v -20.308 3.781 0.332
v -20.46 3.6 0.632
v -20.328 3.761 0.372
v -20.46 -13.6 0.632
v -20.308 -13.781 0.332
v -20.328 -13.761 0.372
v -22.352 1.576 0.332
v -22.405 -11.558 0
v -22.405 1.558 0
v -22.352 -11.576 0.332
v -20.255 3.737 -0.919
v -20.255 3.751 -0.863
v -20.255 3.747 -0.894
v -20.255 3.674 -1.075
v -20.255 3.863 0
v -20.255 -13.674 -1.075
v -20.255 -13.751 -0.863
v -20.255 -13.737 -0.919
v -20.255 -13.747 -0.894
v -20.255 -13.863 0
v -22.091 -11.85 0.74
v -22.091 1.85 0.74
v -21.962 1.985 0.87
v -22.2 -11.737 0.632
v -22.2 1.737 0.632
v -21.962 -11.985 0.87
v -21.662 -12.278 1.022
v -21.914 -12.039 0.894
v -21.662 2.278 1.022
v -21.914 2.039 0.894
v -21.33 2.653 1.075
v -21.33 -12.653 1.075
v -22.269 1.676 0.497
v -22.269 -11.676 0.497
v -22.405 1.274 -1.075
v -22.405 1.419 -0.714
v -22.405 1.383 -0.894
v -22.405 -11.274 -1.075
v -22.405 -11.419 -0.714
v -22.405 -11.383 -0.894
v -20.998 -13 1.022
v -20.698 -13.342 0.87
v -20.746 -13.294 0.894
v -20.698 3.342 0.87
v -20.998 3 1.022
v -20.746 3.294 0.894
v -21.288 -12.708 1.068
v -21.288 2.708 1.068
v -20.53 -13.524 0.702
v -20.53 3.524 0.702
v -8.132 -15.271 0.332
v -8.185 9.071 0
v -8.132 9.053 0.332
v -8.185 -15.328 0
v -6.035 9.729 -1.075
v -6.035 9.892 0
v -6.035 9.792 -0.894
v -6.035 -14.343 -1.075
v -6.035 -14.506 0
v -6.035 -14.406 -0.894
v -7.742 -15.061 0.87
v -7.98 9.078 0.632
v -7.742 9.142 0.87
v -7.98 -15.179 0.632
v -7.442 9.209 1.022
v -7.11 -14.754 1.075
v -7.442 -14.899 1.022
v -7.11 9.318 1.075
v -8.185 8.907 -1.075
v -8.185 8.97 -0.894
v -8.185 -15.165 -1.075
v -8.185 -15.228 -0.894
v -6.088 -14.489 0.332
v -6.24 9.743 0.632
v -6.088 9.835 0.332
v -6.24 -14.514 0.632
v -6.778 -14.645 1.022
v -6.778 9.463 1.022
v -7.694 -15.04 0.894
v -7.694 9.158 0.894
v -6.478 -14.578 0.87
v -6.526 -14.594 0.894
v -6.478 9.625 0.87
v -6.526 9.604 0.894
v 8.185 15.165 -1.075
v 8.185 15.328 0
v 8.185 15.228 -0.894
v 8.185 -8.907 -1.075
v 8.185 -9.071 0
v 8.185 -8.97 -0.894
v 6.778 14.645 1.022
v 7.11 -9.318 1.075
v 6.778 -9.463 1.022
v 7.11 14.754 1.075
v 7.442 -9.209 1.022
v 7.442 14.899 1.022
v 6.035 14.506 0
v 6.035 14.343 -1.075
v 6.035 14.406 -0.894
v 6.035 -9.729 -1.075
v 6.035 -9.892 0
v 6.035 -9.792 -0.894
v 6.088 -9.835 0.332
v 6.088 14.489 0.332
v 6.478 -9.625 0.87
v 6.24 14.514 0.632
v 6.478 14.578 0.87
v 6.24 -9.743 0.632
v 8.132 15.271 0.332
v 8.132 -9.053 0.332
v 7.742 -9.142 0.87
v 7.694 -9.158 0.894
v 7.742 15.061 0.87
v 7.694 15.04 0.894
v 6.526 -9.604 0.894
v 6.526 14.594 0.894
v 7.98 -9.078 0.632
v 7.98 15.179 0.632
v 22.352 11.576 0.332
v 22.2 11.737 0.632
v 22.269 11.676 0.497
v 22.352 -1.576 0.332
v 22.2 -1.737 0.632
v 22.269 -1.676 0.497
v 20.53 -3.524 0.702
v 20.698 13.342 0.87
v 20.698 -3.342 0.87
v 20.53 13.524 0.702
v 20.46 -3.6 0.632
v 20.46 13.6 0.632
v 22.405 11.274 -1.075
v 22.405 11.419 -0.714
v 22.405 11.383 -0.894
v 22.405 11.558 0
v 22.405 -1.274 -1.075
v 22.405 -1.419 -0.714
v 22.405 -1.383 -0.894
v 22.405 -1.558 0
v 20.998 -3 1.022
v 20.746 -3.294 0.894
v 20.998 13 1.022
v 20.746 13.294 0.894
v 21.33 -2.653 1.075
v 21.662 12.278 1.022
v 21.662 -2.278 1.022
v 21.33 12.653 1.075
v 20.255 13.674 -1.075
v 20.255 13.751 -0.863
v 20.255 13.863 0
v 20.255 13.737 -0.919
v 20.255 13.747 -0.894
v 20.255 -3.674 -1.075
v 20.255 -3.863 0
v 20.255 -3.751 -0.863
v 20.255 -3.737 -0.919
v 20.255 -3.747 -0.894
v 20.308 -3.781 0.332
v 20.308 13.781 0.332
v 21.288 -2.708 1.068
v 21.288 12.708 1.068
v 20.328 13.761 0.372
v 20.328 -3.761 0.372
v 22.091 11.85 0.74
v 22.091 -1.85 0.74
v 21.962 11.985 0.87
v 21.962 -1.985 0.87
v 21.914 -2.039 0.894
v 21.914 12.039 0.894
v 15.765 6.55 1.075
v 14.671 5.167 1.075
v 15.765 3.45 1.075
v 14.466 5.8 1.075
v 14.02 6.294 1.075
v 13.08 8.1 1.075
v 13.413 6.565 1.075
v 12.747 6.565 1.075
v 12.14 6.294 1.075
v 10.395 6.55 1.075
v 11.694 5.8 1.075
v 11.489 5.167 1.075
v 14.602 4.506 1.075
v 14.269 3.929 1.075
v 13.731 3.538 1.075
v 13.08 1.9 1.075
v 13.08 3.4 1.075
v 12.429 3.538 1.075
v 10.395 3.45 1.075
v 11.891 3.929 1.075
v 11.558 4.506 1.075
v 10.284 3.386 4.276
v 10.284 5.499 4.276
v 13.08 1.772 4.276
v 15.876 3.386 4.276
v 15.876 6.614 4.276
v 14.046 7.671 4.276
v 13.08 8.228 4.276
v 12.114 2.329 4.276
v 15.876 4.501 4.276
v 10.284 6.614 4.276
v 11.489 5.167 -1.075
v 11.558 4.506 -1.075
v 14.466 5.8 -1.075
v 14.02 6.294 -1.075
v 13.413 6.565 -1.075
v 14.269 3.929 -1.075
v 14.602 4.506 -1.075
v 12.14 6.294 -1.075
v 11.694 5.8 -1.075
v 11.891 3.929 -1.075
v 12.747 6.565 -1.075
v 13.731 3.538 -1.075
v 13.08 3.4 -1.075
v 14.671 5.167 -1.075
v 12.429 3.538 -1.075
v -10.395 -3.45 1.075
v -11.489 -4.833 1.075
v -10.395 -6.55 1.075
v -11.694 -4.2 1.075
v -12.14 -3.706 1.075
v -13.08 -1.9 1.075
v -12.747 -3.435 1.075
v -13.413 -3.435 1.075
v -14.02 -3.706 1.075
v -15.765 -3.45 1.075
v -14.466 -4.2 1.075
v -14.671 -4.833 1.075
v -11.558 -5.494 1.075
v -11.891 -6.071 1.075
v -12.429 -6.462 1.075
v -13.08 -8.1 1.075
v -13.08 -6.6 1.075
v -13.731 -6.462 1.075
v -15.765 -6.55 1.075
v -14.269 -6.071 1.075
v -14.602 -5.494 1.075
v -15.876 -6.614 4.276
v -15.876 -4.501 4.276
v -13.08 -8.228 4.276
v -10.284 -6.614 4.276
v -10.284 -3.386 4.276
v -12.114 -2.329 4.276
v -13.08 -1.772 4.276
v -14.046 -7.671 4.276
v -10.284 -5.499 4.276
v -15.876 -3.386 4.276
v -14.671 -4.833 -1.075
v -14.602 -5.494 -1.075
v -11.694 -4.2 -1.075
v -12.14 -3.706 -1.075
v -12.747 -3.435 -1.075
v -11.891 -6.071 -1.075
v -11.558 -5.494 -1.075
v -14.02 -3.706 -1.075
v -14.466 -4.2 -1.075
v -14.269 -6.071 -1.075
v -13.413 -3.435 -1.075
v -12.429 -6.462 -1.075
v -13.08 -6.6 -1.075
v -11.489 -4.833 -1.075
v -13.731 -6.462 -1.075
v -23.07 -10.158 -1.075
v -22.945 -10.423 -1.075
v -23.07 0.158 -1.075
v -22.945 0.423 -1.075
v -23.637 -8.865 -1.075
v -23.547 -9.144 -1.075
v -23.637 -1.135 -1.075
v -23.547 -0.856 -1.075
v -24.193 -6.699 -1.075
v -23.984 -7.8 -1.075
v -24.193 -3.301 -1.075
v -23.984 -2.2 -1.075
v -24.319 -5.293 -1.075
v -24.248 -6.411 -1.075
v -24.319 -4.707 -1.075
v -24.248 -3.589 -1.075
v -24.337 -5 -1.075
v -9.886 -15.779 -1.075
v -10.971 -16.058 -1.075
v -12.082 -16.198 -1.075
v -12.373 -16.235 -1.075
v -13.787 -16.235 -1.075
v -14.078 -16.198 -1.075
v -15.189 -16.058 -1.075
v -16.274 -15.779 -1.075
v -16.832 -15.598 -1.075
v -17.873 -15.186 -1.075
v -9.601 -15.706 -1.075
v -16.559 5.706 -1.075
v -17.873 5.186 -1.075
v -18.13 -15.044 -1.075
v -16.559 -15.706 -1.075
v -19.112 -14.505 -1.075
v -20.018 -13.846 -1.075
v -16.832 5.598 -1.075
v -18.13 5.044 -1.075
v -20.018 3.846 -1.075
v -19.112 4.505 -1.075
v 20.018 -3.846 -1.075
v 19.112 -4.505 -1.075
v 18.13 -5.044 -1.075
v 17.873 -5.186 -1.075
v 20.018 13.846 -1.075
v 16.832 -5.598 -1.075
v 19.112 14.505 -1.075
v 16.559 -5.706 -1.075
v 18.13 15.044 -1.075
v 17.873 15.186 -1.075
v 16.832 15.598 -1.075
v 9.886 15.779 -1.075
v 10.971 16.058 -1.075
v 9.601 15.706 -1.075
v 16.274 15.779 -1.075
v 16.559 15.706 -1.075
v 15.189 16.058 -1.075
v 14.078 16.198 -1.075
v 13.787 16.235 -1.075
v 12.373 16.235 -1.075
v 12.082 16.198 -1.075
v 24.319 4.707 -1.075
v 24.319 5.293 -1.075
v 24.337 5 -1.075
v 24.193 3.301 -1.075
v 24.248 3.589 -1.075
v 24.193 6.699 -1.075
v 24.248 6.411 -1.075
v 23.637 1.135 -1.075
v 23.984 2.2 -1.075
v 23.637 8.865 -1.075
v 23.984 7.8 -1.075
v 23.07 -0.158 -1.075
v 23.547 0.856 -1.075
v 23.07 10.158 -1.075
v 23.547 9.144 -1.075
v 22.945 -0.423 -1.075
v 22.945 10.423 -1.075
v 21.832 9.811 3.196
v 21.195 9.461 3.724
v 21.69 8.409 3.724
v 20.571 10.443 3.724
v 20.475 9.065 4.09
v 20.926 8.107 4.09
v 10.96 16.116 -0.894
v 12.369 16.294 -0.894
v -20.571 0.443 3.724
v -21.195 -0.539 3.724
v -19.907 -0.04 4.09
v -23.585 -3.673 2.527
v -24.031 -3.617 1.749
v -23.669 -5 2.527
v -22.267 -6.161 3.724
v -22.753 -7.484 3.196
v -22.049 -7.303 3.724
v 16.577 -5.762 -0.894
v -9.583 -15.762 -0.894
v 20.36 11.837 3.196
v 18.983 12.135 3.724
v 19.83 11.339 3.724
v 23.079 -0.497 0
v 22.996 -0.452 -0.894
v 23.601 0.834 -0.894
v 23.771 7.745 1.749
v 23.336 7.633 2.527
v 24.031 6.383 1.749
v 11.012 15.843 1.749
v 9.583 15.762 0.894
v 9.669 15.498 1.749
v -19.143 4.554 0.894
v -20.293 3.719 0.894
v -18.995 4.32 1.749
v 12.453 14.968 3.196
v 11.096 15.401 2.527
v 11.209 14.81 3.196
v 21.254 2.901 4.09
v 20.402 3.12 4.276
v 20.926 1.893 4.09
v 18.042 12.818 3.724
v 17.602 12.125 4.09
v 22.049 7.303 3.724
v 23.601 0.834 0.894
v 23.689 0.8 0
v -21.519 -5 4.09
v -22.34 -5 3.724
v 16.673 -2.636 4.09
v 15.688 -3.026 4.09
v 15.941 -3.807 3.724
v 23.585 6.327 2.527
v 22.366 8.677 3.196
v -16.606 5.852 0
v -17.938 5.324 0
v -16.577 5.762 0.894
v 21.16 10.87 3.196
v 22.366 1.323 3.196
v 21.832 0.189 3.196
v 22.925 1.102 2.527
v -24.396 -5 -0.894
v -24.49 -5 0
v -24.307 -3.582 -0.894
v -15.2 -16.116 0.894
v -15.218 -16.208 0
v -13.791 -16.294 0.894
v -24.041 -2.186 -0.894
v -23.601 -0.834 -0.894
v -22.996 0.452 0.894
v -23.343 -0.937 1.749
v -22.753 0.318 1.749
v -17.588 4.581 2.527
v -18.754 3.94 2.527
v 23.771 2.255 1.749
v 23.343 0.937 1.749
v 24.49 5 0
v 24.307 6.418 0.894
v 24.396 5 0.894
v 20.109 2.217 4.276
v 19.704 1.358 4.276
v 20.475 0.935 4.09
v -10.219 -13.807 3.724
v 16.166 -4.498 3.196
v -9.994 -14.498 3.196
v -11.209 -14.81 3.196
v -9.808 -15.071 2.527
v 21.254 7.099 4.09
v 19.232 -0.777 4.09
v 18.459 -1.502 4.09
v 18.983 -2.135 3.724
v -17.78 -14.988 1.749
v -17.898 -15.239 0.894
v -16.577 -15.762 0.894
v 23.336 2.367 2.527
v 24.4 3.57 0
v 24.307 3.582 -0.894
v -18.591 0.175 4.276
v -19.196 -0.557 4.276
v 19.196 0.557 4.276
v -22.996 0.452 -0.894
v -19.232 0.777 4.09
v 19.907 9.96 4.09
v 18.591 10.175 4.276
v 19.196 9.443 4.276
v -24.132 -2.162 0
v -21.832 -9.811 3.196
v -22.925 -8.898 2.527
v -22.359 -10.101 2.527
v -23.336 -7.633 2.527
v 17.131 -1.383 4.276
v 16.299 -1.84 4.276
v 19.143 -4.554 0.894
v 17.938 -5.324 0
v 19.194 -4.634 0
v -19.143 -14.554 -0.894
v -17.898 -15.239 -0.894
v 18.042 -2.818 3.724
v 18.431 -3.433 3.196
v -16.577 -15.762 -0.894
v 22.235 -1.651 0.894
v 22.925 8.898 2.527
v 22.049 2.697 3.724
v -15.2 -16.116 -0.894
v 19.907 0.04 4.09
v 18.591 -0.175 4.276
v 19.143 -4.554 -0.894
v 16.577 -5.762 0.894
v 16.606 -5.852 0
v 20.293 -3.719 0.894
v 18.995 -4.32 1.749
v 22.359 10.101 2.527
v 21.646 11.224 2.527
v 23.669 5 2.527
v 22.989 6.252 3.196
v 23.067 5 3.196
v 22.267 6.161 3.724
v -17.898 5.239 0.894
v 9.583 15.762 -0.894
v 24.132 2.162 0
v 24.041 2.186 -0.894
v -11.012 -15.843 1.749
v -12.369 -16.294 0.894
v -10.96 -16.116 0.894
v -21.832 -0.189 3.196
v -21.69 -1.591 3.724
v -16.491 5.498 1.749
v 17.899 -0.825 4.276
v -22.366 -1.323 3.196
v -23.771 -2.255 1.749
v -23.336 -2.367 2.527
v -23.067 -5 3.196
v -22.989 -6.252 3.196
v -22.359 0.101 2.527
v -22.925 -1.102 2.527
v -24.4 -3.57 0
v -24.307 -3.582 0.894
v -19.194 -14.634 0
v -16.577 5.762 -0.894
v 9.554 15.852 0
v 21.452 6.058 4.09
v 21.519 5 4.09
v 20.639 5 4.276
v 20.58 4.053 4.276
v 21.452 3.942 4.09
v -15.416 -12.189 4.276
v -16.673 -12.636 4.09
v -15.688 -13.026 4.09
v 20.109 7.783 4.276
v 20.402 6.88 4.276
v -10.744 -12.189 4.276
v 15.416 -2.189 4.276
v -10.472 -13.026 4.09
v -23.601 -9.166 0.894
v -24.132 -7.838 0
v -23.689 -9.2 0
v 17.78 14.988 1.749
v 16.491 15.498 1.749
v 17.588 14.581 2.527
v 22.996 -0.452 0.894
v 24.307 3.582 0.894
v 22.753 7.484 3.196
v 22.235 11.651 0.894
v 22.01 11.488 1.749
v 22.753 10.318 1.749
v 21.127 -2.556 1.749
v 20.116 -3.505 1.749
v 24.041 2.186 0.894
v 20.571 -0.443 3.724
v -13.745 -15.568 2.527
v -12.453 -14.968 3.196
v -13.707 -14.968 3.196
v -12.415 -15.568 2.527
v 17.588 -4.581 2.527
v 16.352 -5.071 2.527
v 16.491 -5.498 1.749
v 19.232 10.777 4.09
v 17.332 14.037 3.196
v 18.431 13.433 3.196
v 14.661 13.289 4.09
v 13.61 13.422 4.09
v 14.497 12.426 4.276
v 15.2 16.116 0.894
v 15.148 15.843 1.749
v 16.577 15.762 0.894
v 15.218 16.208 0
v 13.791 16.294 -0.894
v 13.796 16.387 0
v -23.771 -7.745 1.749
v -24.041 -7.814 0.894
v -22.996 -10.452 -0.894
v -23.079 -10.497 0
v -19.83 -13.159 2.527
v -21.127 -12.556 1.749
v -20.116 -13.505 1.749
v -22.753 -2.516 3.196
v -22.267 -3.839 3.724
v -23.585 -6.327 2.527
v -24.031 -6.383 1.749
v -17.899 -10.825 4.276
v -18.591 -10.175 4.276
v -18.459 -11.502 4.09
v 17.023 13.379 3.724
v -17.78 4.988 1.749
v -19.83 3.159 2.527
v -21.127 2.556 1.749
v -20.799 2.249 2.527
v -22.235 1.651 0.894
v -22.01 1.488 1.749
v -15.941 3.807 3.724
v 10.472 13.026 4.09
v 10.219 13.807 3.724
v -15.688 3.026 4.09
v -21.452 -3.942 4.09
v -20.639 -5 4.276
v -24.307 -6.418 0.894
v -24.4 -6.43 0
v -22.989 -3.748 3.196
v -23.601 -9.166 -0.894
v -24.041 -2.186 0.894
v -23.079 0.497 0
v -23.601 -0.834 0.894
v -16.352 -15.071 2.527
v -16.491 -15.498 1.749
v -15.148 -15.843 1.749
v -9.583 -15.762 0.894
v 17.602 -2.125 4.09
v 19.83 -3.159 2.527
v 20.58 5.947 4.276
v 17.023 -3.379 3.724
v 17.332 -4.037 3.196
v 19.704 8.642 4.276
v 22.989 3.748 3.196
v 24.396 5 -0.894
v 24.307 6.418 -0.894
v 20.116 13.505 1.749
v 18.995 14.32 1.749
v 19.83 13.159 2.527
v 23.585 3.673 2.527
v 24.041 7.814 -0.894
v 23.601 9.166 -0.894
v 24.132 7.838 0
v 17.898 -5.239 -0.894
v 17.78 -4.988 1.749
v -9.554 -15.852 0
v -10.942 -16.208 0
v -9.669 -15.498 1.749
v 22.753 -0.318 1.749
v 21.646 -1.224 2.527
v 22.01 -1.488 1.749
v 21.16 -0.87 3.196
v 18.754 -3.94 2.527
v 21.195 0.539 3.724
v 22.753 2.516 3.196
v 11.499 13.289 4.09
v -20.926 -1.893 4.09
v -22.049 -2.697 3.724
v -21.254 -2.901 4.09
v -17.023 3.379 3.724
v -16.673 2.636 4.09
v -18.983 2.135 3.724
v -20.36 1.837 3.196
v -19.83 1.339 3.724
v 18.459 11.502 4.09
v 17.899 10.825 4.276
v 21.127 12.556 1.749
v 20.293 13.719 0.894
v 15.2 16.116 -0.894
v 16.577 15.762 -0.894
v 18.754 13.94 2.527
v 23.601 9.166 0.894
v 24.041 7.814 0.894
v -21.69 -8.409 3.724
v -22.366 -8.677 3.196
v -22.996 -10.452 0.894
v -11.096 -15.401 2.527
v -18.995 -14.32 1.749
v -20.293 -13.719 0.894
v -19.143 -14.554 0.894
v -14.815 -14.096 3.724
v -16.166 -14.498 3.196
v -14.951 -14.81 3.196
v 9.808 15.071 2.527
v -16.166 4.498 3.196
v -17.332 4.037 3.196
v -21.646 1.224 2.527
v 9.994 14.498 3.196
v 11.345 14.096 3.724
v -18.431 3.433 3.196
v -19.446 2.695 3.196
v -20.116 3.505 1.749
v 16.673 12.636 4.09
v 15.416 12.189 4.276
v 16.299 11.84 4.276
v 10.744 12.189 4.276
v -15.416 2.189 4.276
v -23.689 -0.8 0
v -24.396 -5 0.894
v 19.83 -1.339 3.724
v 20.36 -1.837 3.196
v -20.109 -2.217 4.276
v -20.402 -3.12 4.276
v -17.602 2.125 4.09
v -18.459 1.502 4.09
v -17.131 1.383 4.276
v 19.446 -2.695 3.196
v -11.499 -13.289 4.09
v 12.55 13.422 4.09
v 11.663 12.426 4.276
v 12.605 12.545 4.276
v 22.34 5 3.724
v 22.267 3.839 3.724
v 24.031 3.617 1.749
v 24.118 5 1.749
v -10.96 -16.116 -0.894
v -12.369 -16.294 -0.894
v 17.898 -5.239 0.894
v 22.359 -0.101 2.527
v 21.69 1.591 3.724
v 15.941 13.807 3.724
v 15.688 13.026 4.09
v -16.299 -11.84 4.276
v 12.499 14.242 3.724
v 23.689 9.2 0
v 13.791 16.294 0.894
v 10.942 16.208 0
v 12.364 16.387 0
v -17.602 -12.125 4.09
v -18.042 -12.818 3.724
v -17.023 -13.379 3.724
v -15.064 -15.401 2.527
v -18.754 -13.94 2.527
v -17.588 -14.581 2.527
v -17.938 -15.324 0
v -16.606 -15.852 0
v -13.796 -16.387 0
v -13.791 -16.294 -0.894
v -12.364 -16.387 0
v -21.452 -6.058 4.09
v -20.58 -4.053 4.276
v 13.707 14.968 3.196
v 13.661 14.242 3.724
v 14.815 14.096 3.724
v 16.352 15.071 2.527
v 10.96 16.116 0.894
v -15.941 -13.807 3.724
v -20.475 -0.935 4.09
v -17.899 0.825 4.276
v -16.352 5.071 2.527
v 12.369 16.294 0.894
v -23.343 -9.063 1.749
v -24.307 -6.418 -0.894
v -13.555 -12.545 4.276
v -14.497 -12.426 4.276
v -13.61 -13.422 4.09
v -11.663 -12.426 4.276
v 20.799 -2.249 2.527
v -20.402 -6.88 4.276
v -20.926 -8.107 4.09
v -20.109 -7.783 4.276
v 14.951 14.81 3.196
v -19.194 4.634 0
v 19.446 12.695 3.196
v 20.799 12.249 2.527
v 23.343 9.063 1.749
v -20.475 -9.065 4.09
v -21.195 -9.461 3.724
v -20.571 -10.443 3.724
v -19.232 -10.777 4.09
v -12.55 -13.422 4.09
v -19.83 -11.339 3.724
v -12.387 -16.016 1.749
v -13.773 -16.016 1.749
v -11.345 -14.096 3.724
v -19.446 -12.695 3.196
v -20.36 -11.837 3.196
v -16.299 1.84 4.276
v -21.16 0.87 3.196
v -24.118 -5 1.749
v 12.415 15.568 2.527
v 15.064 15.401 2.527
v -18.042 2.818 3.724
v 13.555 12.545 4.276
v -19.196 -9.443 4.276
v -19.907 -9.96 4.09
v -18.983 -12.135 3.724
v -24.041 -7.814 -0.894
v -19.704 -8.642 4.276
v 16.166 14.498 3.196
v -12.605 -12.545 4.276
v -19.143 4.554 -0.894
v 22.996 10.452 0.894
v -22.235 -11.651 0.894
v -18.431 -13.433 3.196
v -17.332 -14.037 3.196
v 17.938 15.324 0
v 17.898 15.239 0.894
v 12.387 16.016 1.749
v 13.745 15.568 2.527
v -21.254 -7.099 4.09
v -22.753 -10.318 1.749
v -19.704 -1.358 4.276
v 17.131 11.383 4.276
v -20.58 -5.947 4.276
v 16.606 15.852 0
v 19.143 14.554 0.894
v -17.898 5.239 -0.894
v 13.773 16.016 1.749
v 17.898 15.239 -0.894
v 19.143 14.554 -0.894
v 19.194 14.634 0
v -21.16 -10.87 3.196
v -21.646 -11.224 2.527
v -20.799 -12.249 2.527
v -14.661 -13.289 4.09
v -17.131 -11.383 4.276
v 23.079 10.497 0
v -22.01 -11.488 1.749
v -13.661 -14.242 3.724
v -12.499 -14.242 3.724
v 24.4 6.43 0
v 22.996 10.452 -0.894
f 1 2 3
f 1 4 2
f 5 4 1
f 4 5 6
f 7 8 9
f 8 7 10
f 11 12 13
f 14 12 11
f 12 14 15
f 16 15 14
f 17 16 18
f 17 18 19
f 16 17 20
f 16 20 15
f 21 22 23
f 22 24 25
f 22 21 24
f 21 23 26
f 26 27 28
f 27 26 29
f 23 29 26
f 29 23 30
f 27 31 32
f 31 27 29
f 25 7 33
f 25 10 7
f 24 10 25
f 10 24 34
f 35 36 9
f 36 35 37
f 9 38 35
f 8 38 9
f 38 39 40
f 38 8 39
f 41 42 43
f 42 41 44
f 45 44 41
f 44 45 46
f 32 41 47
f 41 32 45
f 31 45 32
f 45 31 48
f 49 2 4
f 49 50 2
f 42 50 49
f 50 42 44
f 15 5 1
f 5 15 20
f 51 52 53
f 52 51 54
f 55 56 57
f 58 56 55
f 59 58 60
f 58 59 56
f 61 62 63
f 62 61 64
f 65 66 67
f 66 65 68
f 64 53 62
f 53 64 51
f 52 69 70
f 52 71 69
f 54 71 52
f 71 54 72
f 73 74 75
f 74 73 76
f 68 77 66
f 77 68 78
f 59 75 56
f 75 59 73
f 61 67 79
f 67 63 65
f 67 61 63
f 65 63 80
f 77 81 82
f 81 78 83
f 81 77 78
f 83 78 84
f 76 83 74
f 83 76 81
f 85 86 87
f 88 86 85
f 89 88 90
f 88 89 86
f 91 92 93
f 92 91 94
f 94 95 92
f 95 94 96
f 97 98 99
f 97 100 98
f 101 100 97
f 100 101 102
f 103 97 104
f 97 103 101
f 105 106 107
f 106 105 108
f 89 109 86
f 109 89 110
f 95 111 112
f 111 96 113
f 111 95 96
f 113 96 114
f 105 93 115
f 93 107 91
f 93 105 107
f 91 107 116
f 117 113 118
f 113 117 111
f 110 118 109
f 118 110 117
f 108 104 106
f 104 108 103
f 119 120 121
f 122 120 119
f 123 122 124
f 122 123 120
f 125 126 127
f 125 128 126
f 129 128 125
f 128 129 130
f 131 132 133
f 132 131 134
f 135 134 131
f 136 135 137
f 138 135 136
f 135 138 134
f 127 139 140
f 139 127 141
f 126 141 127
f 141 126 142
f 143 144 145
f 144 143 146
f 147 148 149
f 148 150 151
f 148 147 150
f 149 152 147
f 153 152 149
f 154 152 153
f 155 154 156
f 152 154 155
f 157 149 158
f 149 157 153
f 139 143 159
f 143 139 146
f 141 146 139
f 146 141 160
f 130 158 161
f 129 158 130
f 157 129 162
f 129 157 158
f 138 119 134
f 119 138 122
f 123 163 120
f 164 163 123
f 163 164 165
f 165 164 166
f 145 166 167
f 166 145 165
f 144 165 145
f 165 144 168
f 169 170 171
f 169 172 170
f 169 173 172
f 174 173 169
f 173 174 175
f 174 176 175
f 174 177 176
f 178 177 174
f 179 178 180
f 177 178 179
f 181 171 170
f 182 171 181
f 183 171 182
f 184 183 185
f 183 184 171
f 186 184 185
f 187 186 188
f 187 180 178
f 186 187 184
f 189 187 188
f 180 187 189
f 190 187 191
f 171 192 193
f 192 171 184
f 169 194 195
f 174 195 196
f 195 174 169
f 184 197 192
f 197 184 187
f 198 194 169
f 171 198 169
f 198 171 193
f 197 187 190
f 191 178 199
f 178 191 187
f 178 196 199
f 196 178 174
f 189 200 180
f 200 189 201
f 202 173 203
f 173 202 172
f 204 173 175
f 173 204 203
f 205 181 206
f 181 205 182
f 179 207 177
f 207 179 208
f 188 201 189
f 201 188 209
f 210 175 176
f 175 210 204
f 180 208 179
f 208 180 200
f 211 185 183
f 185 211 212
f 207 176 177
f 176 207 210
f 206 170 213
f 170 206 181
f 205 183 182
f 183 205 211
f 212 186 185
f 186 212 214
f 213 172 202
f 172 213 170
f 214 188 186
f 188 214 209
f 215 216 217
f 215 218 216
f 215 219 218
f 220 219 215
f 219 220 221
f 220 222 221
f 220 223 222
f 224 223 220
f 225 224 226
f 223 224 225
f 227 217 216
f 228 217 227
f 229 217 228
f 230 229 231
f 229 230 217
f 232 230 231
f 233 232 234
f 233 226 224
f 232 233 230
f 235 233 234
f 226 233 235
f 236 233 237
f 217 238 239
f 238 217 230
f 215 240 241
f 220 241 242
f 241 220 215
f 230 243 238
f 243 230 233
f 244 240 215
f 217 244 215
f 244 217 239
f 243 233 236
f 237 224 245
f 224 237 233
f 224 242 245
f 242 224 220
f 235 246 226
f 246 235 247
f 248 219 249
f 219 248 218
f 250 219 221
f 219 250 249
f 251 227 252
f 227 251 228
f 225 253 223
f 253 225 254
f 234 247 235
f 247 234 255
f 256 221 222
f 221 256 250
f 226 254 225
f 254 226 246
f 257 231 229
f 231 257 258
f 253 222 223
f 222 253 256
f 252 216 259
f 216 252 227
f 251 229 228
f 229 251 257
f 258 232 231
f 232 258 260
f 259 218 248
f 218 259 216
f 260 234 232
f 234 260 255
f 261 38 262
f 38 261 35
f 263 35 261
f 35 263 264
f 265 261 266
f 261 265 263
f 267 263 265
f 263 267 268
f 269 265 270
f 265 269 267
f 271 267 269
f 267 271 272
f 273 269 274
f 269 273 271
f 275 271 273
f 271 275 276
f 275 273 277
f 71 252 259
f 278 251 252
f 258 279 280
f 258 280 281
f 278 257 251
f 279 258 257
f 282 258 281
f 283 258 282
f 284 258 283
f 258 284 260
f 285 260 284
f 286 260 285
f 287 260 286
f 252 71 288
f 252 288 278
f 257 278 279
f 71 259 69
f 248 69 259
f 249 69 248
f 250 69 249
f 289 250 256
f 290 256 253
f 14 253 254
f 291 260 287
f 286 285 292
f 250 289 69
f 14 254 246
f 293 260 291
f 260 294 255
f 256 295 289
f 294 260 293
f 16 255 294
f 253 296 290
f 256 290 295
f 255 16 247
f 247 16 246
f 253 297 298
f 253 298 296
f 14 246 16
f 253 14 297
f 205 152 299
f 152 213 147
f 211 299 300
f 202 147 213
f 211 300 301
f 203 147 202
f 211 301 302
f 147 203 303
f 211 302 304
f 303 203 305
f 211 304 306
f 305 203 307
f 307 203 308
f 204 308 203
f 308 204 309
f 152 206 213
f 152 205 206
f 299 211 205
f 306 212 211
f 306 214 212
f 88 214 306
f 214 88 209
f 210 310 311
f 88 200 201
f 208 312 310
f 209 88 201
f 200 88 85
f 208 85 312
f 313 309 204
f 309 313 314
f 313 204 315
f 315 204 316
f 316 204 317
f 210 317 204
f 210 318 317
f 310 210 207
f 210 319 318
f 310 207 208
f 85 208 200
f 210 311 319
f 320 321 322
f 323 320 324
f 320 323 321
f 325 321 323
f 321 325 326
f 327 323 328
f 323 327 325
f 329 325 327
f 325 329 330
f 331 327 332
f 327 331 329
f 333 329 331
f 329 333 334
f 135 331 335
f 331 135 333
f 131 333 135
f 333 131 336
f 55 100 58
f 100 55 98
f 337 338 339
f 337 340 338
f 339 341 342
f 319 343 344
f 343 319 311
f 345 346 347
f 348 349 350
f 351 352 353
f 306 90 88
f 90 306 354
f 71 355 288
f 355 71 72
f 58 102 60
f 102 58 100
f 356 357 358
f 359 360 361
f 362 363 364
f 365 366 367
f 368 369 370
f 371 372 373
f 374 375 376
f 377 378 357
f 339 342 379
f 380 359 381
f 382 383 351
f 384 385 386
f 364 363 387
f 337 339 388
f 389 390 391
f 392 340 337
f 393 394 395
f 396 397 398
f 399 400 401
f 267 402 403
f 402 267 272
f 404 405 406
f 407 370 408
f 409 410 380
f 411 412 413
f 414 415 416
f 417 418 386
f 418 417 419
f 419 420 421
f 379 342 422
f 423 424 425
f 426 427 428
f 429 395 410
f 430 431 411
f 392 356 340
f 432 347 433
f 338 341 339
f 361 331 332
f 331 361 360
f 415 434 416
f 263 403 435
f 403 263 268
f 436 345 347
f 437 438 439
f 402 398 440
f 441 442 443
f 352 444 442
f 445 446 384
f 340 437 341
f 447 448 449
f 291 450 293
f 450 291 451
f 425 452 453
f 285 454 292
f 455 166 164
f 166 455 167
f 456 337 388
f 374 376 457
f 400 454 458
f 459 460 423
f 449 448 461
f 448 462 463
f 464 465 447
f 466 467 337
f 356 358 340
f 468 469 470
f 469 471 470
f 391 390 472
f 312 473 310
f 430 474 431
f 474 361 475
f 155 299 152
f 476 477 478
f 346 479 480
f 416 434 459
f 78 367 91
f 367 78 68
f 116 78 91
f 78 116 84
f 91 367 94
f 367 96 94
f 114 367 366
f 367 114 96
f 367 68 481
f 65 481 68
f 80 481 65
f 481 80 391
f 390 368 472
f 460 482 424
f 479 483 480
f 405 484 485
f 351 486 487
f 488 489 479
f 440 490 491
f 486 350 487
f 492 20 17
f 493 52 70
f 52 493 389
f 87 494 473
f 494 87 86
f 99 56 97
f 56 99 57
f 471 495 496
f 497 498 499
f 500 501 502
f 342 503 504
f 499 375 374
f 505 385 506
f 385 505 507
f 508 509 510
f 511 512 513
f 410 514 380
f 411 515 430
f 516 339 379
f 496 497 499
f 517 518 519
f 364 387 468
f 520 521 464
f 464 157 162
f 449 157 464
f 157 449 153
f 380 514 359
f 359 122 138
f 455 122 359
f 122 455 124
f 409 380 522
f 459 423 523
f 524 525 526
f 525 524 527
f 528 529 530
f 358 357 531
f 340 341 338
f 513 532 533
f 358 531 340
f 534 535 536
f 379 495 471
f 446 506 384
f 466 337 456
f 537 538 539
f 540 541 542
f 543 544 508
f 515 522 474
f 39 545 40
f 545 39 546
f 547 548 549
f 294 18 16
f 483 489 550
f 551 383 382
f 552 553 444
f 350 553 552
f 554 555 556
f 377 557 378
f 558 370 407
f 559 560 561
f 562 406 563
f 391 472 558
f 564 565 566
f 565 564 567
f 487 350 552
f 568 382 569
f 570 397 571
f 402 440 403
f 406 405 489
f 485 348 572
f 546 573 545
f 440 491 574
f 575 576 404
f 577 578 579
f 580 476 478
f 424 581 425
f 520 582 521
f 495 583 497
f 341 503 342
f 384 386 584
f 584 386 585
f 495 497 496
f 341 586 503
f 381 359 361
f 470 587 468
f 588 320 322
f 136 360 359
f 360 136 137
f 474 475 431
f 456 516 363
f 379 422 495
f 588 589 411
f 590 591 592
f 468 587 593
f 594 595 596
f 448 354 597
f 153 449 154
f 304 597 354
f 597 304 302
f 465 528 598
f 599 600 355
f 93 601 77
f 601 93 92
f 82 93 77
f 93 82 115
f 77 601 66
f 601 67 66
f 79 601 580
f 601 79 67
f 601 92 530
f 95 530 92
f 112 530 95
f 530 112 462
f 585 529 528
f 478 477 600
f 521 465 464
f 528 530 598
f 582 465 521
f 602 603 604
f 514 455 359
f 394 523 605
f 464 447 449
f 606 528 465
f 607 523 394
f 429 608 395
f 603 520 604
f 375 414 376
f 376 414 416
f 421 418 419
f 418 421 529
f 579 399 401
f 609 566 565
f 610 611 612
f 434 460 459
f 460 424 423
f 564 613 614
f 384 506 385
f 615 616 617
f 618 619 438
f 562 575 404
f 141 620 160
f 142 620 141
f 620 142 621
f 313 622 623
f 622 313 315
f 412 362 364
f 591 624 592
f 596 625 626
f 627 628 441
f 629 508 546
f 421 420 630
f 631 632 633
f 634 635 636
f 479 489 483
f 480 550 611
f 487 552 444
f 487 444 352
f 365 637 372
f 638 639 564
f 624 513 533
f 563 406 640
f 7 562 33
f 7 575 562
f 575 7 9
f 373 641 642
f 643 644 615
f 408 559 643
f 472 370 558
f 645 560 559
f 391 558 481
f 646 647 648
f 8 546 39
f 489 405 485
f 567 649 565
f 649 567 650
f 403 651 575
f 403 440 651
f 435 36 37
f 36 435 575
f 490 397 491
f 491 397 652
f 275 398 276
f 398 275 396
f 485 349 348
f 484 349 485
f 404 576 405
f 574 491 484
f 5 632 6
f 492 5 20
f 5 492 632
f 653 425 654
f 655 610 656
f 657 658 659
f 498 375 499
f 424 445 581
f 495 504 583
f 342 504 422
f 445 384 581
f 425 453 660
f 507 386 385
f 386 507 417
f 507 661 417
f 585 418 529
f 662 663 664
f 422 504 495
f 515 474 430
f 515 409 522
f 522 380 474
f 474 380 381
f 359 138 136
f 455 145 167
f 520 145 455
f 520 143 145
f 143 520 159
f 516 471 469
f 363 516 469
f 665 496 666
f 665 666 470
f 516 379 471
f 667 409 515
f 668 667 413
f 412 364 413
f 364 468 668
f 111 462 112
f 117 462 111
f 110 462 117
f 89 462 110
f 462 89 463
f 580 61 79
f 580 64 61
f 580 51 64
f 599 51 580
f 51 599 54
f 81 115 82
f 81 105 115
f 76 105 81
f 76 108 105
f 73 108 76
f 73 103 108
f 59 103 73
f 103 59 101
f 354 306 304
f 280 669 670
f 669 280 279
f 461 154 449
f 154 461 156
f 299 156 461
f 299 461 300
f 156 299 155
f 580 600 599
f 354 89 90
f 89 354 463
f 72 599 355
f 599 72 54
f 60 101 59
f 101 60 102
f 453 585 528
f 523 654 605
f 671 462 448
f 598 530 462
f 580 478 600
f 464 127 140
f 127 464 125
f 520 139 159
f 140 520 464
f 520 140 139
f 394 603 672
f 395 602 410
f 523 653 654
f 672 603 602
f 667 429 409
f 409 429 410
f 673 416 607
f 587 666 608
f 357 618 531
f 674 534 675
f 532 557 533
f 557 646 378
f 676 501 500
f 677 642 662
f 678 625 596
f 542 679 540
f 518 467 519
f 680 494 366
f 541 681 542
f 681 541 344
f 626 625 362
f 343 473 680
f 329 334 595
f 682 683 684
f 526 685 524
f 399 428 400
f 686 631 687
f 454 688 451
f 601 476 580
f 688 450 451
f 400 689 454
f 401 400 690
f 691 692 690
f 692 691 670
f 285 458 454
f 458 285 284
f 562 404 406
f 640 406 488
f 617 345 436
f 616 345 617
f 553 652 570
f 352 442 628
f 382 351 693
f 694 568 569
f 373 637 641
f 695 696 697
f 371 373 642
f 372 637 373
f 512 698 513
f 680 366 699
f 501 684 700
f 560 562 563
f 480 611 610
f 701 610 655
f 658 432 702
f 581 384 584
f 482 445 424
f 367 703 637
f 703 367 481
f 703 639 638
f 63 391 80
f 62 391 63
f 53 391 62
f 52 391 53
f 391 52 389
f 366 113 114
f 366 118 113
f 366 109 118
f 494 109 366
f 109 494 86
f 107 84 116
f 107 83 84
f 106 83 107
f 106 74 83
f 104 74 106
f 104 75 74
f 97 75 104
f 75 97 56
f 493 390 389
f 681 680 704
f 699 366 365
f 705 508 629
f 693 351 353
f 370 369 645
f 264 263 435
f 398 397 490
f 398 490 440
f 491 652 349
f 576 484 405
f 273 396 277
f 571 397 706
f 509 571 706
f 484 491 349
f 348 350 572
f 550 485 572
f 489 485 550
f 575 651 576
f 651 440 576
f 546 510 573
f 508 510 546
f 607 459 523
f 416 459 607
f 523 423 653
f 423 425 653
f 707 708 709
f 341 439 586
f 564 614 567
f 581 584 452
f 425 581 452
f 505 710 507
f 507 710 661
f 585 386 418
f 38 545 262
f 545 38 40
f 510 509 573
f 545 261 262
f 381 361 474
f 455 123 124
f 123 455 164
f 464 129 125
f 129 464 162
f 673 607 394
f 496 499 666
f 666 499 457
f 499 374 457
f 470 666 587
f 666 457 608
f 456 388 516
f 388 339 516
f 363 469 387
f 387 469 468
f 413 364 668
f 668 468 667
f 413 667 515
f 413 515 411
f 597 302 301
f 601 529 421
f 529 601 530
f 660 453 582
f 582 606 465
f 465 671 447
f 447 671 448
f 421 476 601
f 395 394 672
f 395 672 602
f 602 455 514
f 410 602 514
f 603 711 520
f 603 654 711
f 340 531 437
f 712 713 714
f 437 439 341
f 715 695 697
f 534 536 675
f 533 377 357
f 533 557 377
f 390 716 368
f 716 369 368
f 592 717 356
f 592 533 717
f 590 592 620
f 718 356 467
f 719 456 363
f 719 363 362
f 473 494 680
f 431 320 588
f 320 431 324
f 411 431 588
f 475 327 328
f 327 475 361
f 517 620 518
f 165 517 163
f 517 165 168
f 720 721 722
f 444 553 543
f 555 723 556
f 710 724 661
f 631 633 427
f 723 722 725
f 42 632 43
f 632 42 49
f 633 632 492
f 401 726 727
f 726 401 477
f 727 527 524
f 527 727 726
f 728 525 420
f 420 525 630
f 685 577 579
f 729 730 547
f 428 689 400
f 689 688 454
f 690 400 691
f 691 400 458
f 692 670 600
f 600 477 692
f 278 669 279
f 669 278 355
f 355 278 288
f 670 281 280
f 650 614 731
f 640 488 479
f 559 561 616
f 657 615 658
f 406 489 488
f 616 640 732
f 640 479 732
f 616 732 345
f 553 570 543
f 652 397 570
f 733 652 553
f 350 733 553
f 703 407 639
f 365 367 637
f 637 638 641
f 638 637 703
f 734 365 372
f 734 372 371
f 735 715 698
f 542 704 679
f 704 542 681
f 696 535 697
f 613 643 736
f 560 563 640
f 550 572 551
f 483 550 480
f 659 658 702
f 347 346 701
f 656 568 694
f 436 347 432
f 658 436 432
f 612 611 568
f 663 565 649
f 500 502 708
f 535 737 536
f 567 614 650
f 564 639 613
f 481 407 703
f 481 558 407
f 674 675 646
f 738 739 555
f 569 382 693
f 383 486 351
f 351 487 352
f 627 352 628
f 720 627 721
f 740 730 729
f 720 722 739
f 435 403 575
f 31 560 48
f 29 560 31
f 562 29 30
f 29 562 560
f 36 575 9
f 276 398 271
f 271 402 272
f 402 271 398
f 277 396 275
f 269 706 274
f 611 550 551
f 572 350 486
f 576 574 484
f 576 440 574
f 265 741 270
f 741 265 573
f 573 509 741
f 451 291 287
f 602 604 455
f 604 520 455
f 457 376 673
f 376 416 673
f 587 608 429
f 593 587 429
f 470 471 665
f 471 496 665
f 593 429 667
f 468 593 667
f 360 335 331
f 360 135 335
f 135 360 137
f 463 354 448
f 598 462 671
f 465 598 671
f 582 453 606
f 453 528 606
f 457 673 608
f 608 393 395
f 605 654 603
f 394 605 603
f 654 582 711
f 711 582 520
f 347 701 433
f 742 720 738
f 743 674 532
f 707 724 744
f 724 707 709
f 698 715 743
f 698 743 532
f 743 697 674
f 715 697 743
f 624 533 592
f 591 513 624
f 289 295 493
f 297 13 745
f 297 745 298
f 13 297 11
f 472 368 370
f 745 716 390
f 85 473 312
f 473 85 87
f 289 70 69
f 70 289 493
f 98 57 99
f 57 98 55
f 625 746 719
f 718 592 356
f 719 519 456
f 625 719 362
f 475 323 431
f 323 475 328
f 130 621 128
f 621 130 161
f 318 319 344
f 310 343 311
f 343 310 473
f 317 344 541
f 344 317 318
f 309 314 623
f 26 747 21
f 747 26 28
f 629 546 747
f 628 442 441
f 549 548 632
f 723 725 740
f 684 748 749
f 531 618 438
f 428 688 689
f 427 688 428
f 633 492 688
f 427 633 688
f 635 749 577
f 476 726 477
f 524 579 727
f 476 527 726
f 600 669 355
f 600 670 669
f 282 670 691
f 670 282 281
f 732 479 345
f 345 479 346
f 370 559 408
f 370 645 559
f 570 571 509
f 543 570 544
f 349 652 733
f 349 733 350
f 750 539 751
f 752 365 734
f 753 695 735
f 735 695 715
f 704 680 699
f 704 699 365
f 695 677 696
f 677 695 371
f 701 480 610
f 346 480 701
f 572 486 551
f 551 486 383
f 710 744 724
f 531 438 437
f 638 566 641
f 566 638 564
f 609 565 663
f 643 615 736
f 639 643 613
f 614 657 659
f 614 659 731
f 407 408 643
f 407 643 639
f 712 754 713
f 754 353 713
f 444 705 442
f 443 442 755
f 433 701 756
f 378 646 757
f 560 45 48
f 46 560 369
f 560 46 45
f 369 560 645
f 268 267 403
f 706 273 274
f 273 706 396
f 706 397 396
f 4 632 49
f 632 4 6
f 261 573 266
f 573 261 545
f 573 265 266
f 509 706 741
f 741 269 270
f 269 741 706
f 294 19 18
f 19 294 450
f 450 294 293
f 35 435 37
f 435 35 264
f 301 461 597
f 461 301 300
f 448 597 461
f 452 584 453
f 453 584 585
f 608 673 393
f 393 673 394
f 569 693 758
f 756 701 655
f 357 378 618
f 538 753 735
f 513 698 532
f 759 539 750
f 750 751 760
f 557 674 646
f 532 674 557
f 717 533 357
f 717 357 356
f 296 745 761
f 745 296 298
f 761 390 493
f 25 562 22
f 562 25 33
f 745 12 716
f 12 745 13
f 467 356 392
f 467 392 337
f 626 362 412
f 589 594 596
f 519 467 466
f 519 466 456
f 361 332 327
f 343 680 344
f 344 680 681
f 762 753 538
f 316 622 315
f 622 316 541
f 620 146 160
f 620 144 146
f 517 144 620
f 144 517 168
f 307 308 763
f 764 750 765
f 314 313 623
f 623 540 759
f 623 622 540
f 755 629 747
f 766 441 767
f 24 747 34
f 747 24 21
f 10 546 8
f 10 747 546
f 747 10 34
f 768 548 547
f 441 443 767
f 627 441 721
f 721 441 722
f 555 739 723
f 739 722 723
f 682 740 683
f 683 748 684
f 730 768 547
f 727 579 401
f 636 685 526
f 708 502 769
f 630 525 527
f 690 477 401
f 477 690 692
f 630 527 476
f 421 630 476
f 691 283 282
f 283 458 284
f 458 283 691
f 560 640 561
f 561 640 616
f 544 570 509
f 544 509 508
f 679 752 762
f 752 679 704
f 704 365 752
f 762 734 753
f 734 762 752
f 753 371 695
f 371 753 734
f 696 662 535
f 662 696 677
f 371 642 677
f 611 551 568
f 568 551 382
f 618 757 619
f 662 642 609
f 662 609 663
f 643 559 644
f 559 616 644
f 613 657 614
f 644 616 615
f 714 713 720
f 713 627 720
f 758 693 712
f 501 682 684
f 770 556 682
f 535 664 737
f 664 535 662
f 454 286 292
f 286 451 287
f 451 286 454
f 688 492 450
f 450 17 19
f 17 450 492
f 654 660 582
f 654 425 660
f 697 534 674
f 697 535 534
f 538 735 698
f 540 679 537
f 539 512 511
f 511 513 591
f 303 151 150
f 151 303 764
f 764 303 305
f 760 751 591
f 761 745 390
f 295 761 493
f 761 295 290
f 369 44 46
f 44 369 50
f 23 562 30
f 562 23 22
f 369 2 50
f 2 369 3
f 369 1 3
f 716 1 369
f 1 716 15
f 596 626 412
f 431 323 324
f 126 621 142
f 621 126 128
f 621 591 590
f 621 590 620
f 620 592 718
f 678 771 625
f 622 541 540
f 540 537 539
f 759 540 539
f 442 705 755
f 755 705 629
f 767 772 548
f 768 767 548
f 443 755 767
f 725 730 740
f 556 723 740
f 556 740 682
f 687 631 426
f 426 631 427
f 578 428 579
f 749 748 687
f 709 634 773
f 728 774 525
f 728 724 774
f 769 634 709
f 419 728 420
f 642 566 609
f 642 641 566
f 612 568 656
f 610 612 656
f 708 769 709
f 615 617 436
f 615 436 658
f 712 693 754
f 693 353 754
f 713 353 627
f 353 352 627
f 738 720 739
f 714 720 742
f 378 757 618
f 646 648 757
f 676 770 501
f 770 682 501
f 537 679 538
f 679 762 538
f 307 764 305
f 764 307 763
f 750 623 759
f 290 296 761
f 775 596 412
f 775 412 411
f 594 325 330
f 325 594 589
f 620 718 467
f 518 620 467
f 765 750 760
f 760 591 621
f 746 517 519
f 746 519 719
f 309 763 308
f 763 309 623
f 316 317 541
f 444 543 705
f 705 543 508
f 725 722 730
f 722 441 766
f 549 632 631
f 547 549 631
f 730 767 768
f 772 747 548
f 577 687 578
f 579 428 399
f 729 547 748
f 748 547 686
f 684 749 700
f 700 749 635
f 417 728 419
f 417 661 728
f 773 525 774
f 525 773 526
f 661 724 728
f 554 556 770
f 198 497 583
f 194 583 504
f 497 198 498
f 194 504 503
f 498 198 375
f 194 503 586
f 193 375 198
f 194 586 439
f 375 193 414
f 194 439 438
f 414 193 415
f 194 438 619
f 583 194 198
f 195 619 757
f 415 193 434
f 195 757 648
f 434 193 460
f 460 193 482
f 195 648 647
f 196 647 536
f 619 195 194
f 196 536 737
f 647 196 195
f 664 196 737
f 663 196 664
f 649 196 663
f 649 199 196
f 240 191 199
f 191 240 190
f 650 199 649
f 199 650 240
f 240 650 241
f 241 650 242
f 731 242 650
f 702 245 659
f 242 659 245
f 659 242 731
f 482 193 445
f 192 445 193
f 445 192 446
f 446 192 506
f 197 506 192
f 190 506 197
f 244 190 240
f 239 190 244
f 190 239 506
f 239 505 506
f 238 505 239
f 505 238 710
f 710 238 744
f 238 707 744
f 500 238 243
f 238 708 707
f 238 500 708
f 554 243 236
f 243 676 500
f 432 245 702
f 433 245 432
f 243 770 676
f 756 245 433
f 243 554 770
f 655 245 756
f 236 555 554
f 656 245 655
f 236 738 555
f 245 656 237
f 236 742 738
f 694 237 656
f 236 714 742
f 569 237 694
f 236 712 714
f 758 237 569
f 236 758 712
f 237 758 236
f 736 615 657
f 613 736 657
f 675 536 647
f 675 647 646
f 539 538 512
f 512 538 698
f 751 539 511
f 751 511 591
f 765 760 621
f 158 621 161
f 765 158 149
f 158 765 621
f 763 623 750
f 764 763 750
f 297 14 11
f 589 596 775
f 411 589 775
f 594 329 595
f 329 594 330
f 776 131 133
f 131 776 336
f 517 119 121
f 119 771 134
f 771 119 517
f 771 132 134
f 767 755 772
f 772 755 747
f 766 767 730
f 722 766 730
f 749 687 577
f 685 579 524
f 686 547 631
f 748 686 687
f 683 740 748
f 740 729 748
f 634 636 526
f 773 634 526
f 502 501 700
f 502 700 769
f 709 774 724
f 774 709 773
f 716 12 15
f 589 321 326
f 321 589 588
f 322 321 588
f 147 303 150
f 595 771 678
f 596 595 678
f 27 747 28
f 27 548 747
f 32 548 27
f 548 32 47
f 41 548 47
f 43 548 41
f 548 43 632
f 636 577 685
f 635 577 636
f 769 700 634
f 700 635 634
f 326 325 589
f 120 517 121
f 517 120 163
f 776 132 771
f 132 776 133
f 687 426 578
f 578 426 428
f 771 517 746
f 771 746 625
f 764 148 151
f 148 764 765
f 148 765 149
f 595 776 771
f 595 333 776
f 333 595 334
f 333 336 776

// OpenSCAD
// file: M3.scad
module M3_spacer() {
    union(){
        cylinder( 5, 3.1, 3.3, false, $fn = 6);
        translate([0, 0, -4.9])cylinder(  10, 1.6, 1.6, true, $fn = 15);
    };
}

/*
difference(){
    cube([9,9,6],true);
    M3_spacer ();
}
*/

//M3_spacer();
// main file
include <M3.scad>

thickness = 2.15;
distance = 14.22;

x = 26.16;
y = 10;

difference(){
    hull(){
    translate ([x/2, y/2, 0])
        rotate_extrude(convexity = 10, $fn = 50)
            translate([distance * 0.5, 0, 0])
                circle(r = thickness * 2, $fn = 30);
    translate ([-x/2, -y/2, 0])
        rotate_extrude(convexity = 10, $fn = 50)
            translate([distance * 0.5, 0, 0])
                circle(r = thickness * 2, $fn = 30);
    }
    union(){
        for (i = [-distance* 1.5, -distance/2, distance/2, distance* 1.5])
            translate ([i, 0, 0]) 
                hull(){
                    rotate ([90, 0, 0])
                    cylinder (distance*3, thickness/2, thickness/2, true, $fn = 20);
                    translate([0, 0, -thickness * 2])rotate ([90, 0, 0])
                    cylinder (distance*4, thickness/2, thickness/2, true, $fn = 20);
                }
        translate ([0, 0, -distance -thickness/2]) cylinder (distance*2, distance*5, distance*5, true);   
        translate ([x/2, y/2, 0])
            translate([0, 0, thickness/2])rotate ([0, 0, 30])M3_spacer();      
        translate ([-x/2, -y/2, 0])
            translate([0, 0, thickness/2])rotate ([0, 0, 30])M3_spacer();  
    }
}
